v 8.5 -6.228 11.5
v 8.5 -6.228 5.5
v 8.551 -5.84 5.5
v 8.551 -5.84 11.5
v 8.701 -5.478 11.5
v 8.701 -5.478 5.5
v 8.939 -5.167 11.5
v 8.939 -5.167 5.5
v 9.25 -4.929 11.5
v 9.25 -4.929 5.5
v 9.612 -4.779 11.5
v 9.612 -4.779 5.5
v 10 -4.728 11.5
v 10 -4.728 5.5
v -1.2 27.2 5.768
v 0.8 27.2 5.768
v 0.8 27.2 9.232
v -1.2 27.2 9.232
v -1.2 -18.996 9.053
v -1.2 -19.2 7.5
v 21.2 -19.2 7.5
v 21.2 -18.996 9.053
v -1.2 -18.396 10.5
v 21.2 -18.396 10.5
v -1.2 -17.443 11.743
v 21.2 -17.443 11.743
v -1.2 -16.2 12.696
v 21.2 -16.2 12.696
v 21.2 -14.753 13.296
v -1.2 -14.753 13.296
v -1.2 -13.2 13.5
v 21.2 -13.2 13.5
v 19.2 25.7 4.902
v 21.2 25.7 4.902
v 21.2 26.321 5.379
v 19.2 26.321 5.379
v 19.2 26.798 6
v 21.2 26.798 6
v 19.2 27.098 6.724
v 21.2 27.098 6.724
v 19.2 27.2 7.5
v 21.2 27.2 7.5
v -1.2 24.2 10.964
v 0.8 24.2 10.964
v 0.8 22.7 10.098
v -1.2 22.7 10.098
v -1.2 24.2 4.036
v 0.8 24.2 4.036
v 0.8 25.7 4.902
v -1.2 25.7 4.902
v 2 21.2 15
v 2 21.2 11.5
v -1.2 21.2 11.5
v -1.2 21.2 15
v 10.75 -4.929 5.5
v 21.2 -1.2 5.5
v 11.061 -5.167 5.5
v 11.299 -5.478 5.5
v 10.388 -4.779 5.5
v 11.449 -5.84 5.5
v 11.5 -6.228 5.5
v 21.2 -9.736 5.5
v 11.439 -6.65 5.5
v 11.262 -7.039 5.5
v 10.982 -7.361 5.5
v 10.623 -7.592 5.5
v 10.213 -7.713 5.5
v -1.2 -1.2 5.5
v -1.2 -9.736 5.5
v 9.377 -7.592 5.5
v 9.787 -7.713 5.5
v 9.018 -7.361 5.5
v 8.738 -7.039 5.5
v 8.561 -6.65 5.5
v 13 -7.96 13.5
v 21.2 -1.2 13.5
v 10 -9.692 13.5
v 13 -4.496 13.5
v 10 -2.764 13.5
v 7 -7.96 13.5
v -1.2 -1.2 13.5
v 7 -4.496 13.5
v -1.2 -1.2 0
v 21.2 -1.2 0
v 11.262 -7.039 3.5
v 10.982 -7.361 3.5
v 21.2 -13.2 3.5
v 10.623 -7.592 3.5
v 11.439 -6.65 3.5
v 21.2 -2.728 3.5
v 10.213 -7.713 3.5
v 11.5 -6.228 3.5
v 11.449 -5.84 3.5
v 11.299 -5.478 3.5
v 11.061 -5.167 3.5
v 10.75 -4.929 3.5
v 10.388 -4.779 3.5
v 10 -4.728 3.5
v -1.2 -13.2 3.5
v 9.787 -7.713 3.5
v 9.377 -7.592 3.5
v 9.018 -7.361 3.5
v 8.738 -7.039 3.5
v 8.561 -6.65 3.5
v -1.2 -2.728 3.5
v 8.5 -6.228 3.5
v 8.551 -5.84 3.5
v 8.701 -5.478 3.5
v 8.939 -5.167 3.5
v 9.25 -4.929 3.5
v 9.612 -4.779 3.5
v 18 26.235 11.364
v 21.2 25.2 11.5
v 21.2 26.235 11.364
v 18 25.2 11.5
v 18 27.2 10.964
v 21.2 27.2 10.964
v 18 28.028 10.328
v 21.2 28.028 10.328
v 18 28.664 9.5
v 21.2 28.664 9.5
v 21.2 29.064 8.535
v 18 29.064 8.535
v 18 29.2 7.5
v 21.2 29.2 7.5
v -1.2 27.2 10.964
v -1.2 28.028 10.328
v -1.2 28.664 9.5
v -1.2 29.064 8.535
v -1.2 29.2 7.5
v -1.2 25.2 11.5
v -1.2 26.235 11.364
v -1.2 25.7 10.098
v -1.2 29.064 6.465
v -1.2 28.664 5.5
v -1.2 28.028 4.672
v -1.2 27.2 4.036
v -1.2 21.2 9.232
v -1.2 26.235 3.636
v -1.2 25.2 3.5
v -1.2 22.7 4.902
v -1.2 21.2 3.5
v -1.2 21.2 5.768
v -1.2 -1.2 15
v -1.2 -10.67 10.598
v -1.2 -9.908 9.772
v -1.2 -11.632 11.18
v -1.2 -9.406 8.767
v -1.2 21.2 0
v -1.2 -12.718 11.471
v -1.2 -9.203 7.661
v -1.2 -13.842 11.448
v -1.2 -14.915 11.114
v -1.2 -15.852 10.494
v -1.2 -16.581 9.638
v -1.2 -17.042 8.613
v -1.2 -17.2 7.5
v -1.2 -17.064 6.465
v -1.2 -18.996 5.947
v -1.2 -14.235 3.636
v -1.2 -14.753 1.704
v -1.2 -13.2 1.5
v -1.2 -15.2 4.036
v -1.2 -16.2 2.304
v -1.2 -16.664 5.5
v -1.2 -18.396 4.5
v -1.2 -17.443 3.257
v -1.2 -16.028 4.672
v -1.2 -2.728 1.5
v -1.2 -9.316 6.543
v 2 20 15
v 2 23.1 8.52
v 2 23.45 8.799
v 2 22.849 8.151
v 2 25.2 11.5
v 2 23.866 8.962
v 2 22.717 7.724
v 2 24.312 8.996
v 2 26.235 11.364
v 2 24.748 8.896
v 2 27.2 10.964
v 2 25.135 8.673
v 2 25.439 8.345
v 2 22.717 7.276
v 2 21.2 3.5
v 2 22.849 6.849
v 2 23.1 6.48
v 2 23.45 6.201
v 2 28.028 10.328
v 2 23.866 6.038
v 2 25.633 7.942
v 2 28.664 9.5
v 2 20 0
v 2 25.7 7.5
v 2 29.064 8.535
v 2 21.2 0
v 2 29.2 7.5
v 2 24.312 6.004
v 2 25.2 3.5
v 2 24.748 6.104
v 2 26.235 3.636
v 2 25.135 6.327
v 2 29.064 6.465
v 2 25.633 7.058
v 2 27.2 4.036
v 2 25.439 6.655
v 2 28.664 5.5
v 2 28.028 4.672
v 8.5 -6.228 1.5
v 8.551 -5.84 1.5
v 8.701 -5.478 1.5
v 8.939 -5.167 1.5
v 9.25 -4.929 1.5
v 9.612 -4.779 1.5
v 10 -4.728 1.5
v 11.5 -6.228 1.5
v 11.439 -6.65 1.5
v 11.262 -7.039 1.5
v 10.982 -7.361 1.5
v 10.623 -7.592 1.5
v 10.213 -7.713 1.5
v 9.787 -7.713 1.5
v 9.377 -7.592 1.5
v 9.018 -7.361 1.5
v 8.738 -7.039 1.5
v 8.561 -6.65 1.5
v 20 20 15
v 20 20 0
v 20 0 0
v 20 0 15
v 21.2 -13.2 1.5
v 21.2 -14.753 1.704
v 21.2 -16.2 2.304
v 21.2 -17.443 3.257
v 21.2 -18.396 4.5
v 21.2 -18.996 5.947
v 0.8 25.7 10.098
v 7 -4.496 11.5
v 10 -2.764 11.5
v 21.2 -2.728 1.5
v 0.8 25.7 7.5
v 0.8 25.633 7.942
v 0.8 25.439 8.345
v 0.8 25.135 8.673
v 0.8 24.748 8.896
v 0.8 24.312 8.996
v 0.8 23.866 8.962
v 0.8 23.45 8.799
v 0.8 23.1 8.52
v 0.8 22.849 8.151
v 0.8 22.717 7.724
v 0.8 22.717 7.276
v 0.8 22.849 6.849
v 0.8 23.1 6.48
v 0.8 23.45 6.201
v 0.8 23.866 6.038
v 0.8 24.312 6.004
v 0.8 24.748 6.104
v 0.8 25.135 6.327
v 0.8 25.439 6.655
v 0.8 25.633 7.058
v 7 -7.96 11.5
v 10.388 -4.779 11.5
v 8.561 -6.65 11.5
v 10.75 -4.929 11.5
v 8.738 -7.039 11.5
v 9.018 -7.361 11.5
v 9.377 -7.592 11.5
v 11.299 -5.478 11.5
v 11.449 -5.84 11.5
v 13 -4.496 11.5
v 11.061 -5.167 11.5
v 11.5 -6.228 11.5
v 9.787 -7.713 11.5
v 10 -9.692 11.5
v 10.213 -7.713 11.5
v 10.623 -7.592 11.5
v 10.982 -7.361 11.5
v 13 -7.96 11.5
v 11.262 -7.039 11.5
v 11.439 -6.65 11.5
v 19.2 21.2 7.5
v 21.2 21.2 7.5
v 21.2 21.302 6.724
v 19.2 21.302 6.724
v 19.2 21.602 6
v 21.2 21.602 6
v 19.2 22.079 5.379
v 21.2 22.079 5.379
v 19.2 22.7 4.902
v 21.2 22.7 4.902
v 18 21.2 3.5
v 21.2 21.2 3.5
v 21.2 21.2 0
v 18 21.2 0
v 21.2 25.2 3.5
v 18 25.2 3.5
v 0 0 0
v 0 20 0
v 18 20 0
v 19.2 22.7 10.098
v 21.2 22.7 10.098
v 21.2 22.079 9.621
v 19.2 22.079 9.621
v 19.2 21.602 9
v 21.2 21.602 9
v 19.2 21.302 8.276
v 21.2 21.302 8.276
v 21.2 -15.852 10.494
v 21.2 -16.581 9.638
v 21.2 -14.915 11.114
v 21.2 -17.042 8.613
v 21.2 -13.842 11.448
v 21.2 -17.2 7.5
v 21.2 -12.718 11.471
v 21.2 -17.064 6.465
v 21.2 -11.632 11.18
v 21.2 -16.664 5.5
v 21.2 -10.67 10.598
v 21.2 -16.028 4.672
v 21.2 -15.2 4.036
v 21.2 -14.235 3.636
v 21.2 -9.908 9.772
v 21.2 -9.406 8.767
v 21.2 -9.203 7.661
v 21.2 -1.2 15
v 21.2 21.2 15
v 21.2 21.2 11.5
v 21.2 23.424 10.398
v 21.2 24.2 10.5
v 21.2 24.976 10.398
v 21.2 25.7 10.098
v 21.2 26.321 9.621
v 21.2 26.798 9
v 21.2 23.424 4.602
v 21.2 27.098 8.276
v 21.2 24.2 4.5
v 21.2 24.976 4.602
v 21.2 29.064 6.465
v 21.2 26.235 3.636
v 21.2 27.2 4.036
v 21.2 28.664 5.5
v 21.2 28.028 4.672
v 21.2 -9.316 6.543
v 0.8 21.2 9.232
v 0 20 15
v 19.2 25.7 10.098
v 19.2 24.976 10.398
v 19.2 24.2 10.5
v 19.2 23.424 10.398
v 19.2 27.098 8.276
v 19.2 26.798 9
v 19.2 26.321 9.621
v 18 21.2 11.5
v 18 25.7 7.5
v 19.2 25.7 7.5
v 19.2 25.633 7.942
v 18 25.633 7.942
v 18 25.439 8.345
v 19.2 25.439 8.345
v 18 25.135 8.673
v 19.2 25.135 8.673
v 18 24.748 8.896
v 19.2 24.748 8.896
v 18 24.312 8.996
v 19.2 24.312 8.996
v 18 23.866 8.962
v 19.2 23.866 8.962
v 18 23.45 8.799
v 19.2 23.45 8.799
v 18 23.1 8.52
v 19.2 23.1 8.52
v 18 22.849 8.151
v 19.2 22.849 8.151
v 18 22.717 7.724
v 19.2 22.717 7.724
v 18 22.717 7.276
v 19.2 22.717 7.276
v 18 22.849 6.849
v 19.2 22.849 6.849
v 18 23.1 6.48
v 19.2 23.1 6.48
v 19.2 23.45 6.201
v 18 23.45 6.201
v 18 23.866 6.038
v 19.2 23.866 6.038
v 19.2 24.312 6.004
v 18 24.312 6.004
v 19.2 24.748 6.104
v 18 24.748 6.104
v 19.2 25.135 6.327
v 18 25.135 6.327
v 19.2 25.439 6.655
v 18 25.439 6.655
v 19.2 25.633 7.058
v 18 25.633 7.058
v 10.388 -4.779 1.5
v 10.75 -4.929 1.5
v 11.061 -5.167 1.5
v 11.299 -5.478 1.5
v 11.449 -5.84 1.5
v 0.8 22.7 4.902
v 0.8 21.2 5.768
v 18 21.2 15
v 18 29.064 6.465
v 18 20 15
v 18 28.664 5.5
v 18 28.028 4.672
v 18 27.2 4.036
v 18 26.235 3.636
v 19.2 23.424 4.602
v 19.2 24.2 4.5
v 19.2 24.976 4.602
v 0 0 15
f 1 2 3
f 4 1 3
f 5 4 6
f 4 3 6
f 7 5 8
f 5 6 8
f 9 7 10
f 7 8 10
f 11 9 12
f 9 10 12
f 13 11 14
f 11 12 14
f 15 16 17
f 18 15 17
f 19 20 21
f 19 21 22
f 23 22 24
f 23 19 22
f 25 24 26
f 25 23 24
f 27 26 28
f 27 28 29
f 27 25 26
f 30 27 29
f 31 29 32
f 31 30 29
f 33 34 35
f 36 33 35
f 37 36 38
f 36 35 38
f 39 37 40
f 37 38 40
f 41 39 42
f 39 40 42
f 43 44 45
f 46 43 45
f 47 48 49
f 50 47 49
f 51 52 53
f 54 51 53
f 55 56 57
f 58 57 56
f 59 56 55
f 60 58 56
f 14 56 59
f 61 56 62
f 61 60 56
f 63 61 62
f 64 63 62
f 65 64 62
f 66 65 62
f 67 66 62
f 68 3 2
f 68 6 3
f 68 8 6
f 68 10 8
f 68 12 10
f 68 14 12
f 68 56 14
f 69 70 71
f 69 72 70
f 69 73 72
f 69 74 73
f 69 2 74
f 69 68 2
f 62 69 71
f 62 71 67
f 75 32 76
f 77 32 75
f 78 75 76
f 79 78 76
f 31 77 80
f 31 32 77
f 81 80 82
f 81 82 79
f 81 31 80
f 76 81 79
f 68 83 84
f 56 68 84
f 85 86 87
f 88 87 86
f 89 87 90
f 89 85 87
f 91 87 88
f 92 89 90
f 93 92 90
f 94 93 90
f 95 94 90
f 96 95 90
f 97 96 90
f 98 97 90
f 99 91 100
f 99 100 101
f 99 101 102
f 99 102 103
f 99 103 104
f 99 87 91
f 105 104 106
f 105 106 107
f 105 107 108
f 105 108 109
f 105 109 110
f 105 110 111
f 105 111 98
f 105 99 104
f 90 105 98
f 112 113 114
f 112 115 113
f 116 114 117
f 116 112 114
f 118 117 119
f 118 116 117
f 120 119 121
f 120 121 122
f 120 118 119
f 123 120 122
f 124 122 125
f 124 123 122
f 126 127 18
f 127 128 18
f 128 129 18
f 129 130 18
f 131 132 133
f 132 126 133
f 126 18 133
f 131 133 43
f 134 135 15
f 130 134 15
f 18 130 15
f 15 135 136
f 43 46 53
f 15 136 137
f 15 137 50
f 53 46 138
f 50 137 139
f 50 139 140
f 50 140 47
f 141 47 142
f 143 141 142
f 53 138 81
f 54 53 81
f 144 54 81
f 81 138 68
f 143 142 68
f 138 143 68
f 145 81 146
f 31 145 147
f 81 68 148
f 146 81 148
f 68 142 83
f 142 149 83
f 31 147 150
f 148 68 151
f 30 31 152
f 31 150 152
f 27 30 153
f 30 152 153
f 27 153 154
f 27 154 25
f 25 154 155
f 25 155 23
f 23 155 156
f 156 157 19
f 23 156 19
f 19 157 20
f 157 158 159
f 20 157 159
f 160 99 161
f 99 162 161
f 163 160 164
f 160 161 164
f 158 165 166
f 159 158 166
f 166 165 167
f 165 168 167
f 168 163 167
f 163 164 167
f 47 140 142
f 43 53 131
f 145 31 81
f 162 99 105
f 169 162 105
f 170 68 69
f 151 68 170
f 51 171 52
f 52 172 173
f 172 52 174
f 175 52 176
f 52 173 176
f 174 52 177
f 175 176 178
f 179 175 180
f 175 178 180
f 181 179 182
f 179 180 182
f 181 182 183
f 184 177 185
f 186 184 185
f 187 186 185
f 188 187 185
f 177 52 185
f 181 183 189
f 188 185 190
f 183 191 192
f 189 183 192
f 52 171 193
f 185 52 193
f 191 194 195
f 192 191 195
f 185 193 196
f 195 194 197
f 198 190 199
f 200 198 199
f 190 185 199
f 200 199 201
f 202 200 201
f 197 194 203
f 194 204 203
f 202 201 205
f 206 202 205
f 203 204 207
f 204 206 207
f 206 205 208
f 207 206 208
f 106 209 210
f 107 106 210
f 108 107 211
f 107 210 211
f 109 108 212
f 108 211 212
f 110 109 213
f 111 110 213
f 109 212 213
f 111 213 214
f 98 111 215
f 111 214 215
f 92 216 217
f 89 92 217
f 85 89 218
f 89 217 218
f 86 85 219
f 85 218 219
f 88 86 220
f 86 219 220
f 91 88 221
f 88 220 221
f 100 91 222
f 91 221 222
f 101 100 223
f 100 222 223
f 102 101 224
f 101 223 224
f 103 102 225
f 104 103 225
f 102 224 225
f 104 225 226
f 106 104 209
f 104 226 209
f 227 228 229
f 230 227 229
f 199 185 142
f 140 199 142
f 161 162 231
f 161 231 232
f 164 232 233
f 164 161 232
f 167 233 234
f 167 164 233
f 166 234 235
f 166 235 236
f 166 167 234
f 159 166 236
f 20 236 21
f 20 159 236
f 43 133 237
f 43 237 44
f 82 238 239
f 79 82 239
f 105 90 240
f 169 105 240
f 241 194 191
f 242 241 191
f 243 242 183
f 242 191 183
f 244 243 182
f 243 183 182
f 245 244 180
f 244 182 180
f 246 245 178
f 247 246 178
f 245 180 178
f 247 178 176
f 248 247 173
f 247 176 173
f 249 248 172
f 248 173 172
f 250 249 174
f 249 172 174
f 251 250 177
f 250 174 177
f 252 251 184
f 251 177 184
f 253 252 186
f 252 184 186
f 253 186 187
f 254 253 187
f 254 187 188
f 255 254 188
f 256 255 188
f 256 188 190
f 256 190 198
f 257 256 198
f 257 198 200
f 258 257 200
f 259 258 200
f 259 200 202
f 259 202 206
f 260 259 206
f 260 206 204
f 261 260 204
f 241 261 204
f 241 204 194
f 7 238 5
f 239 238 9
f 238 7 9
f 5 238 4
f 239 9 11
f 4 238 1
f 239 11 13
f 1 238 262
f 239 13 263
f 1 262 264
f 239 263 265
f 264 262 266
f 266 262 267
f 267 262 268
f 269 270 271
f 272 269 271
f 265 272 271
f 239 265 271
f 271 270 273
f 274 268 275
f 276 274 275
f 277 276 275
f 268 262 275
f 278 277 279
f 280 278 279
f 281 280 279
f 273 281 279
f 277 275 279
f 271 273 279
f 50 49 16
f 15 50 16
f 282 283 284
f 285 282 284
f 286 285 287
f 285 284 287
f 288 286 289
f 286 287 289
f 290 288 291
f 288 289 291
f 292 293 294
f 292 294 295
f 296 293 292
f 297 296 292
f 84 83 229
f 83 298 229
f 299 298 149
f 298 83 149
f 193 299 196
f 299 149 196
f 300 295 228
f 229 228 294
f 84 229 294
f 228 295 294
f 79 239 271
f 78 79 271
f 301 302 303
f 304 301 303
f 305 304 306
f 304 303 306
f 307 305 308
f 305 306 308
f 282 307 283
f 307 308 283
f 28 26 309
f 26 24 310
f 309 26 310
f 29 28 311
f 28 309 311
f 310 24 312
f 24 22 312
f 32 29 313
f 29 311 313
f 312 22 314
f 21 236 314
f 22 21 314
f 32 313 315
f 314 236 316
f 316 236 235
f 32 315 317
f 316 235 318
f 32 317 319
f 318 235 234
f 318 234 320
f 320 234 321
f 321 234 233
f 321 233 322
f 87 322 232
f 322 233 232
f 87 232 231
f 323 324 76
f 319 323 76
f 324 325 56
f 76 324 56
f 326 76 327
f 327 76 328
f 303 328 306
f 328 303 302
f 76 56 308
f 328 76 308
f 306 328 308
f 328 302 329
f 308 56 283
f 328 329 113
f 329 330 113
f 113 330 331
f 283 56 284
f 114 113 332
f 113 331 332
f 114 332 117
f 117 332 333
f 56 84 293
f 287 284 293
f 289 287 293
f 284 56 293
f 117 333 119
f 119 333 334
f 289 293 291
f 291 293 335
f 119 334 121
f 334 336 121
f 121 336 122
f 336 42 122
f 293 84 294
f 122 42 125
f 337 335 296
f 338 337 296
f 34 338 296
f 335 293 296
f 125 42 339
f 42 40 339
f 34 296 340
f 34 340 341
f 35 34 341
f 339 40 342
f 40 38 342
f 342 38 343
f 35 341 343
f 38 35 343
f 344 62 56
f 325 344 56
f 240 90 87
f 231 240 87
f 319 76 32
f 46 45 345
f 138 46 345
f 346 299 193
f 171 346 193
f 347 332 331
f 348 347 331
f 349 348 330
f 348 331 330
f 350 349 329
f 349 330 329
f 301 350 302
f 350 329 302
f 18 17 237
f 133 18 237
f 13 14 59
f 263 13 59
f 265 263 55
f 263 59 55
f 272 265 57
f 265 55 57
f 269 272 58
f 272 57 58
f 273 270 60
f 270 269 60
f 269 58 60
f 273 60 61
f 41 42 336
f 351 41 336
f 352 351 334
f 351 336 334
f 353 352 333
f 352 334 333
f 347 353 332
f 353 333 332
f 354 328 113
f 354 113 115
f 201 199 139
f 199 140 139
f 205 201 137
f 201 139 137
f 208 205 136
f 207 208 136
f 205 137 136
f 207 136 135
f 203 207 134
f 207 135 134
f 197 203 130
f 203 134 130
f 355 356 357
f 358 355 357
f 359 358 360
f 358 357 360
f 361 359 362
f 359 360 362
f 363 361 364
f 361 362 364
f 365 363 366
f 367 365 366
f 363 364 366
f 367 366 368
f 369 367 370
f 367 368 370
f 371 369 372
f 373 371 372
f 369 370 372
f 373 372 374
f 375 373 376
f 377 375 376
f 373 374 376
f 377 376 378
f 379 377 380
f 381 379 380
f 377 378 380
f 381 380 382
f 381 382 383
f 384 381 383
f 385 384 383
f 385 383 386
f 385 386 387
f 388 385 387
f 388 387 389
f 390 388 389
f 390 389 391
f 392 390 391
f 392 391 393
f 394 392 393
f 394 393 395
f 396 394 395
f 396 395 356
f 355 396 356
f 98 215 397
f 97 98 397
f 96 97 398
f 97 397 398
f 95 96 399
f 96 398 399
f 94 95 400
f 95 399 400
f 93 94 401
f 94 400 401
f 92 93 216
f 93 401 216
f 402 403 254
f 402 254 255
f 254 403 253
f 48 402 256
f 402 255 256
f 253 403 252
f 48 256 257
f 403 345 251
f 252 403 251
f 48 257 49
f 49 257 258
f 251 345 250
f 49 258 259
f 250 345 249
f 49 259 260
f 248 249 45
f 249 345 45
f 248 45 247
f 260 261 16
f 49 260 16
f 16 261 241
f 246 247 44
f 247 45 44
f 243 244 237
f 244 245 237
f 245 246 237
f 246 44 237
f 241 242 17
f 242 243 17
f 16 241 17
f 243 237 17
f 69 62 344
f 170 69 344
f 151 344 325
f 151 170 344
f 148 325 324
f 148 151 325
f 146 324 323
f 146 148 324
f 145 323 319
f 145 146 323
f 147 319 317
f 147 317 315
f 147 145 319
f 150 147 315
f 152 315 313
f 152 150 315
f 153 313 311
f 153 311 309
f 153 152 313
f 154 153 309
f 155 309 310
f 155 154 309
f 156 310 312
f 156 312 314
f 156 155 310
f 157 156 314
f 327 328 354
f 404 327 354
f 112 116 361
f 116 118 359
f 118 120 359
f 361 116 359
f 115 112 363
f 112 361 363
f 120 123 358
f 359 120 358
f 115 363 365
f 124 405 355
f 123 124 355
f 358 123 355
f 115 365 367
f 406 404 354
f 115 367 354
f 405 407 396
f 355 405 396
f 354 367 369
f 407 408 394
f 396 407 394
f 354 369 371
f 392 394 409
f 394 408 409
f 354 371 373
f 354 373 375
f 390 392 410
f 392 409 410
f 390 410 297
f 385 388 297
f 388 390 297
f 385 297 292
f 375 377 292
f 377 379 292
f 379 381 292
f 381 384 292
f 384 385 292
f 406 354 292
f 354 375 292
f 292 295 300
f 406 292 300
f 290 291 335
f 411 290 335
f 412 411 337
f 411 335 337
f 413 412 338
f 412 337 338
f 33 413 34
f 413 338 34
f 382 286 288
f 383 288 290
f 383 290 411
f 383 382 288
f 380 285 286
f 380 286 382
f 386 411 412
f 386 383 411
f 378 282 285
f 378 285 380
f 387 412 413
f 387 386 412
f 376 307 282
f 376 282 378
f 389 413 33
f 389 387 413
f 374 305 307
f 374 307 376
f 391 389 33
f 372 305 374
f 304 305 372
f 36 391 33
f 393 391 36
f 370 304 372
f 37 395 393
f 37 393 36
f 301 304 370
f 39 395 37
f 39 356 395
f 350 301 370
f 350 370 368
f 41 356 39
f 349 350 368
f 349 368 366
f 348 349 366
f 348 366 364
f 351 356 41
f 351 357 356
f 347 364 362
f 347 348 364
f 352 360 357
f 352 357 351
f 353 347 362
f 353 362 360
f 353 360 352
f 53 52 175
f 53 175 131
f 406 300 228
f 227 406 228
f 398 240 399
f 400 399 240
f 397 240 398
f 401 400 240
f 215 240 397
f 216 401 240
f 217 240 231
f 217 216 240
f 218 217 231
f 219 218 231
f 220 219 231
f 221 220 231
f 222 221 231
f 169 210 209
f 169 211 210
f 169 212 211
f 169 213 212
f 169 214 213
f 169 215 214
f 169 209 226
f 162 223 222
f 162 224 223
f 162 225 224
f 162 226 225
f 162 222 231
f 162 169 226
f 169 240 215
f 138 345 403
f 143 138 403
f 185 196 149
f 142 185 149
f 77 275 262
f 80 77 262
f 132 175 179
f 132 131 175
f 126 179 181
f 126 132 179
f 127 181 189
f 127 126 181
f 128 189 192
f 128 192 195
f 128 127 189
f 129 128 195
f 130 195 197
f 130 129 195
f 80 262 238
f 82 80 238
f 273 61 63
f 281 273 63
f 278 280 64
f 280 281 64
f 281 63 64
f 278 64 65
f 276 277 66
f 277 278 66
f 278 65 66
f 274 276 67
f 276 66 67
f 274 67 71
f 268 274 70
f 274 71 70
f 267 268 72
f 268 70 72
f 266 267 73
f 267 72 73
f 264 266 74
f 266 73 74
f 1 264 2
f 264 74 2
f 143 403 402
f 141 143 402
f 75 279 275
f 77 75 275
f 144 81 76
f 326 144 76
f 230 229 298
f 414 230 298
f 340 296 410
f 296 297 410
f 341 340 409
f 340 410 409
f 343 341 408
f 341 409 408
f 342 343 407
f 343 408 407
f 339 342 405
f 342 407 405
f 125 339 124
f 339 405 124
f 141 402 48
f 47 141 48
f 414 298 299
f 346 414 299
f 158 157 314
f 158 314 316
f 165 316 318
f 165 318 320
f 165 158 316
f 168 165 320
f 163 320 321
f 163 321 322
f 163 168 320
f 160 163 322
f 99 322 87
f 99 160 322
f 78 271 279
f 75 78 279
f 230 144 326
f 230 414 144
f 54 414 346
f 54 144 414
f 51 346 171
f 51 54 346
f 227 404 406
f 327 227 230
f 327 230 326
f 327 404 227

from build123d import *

# Parameters (mm, degrees)
F1_DEPTH  = 15
F3_DEPTH  = 22.4
F5_DEPTH  = 25
F6_START  = -10
F6_DEPTH  = 15
F7_W      = 3.2
F7_H      = 8
F8_DEPTH  = 8
F9_R      = 3.99999
F10_R     = 1.5
F11_DEPTH = 25
F12_DEPTH = 2
F13_START = -20.4
F13_DEPTH = 4.6


# Not quite as in the source:
# - a fillet or chamfer is up to 0.001 mm smaller than in the source, because OpenCascade refuses the exact size


with BuildPart() as f1:
    # F0 (on Top) → F1 (new body)
    with BuildSketch(Plane.XY):
        Polygon((20, 0), (0, 0), (0, 20), (2, 20), (2, 21.2), (-1.2, 21.2), (-1.2, -1.2), (21.2, -1.2), (21.2, 21.2), (18, 21.2), (18, 20), (20, 20), align=None)
    extrude(amount=F1_DEPTH)

    # F2 (on face) → F3 (join)
    with BuildSketch(Plane(origin=(-1.2, 0, 0), x_dir=(0, -1, 0), z_dir=(-1, 0, 0))):
        with BuildLine():
            Line((1.2, 5.5), (7.5431457505, 5.5))
            ThreePointArc((7.5431457505, 5.5), (8.3010205144, 10.9641016151), (13.2, 13.5))
            Line((13.2, 13.5), (1.2, 13.5))
            Line((1.2, 13.5), (1.2, 5.5))
        make_face()
        with BuildLine():
            ThreePointArc((17.2, 7.5), (16.0284271247, 4.6715728753), (13.2, 3.5))
            Line((13.2, 3.5), (8.727864045, 3.5))
            ThreePointArc((8.727864045, 3.5), (10.7505102572, 2.0227744249), (13.2, 1.5))
            ThreePointArc((13.2, 1.5), (17.4426406871, 3.2573593129), (19.2, 7.5))
            ThreePointArc((19.2, 7.5), (17.4426406871, 11.7426406871), (13.2, 13.5))
            ThreePointArc((13.2, 13.5), (8.3010205144, 10.9641016151), (7.5431457505, 5.5))
            Line((7.5431457505, 5.5), (9.7358983849, 5.5))
            ThreePointArc((9.7358983849, 5.5), (12.1647238196, 11.3637033052), (17.2, 7.5))
        make_face()
        with BuildLine():
            ThreePointArc((13.2, 1.5), (10.7505102572, 2.0227744249), (8.727864045, 3.5))
            Line((8.727864045, 3.5), (2.727864045, 3.5))
            Line((2.727864045, 3.5), (2.727864045, 1.5))
            Line((2.727864045, 1.5), (13.2, 1.5))
        make_face()
    extrude(amount=-F3_DEPTH)

    # F4 (on face) → F5 (cut)
    with BuildSketch(Plane(origin=(0, 0, 1.5), x_dir=(1, 0, 0), z_dir=(0, 0, -1))):
        with BuildLine():
            ThreePointArc((8.5, 6.227864045), (8.9393398282, 5.1672038732), (10, 4.727864045))
            Line((10, 4.727864045), (10, 6.227864045))
            Line((10, 6.227864045), (8.5, 6.227864045))
        make_face()
        with BuildLine():
            Line((10, 6.227864045), (10, 4.727864045))
            ThreePointArc((10, 4.727864045), (11.0606601718, 5.1672038732), (11.5, 6.227864045))
            ThreePointArc((11.5, 6.227864045), (10, 7.727864045), (8.5, 6.227864045))
            Line((8.5, 6.227864045), (10, 6.227864045))
        make_face()
    extrude(amount=-F5_DEPTH, mode=Mode.SUBTRACT)

    # F4 (on face) → F6 (cut)
    with BuildSketch(Plane(origin=(0, 0, 1.5), x_dir=(1, 0, 0), z_dir=(0, 0, -1)).offset(F6_START)):
        with BuildLine():
            Line((10, 4.727864045), (10, 2.7637624299))
            Line((10, 2.7637624299), (13, 4.4958132374))
            Line((13, 4.4958132374), (13, 7.9599148526))
            Line((13, 7.9599148526), (10, 9.6919656601))
            Line((10, 9.6919656601), (7, 7.9599148526))
            Line((7, 7.9599148526), (7, 6.227864045))
            Line((7, 6.227864045), (8.5, 6.227864045))
            ThreePointArc((8.5, 6.227864045), (10, 7.727864045), (11.5, 6.227864045))
            ThreePointArc((11.5, 6.227864045), (11.0606601718, 5.1672038732), (10, 4.727864045))
        make_face()
        with BuildLine():
            Line((7, 4.4958132374), (10, 2.7637624299))
            Line((10, 2.7637624299), (10, 4.727864045))
            ThreePointArc((10, 4.727864045), (8.9393398282, 5.1672038732), (8.5, 6.227864045))
            Line((8.5, 6.227864045), (7, 6.227864045))
            Line((7, 6.227864045), (7, 4.4958132374))
        make_face()
    extrude(amount=-F6_DEPTH, mode=Mode.SUBTRACT)

    # F7 (on face) → F8 (join)
    with BuildSketch(Plane(origin=(0, 21.2, 0), x_dir=(-1, 0, 0), z_dir=(0, 1, 0))):
        with Locations((-19.6, 7.5)):
            Rectangle(F7_W, F7_H)
        with Locations((-0.4, 7.5)):
            Rectangle(F7_W, F7_H)
    extrude(amount=F8_DEPTH)

    # F9 (radius 4 in the source; OpenCascade refuses exactly that, so slightly less here)
    f9_edges = [f1.edges().sort_by_distance(p)[0] for p in [
        (19.6, 29.2, 11.5),
        (19.6, 29.2, 3.5),
        (0.4, 29.2, 11.5),
        (0.4, 29.2, 3.5),
    ]]
    fillet(f9_edges, radius=F9_R)

    # F10 (on face) → F11 (cut)
    with BuildSketch(Plane.YZ.offset(21.2)):
        with Locations((24.2, 7.5)):
            Circle(F10_R)
    extrude(amount=-F11_DEPTH, mode=Mode.SUBTRACT)

    # F10 (on face) → F12 (cut)
    with BuildSketch(Plane.YZ.offset(21.2)):
        with BuildLine():
            ThreePointArc((25.7000000635, 4.9019238253), (26.7980762297, 6.0000000317), (27.2, 7.5))
            ThreePointArc((27.2, 7.5), (26.7980761988, 9.0000000218), (25.6999999564, 10.0980762365))
            ThreePointArc((25.6999999564, 10.0980762365), (24.2, 10.5), (22.7000000436, 10.0980762365))
            ThreePointArc((22.7000000436, 10.0980762365), (21.6019238012, 9.0000000218), (21.2, 7.5))
            ThreePointArc((21.2, 7.5), (21.6019238012, 5.9999999782), (22.7000000436, 4.9019237635))
            ThreePointArc((22.7000000436, 4.9019237635), (24.2000000618, 4.5), (25.7000000635, 4.9019238253))
        make_face()
        with Locations((24.2, 7.5)):
            Circle(F10_R, mode=Mode.SUBTRACT)
    extrude(amount=-F12_DEPTH, mode=Mode.SUBTRACT)

    # F10 (on face) → F13 (cut)
    with BuildSketch(Plane.YZ.offset(21.2).offset(F13_START)):
        with BuildLine():
            ThreePointArc((21.2, 7.5), (21.6019238012, 9.0000000218), (22.7000000436, 10.0980762365))
            Line((22.7000000436, 10.0980762365), (21.2, 9.2320508076))
            Line((21.2, 9.2320508076), (21.2, 7.5))
        make_face()
        with BuildLine():
            ThreePointArc((22.7000000436, 10.0980762365), (24.2, 10.5), (25.6999999564, 10.0980762365))
            Line((25.6999999564, 10.0980762365), (24.2, 10.9641016151))
            Line((24.2, 10.9641016151), (22.7000000436, 10.0980762365))
        make_face()
        with BuildLine():
            ThreePointArc((25.6999999564, 10.0980762365), (26.7980761988, 9.0000000218), (27.2, 7.5))
            Line((27.2, 7.5), (27.2, 9.2320508076))
            Line((27.2, 9.2320508076), (25.6999999564, 10.0980762365))
        make_face()
        with BuildLine():
            ThreePointArc((25.7000000635, 4.9019238253), (26.7980762297, 6.0000000317), (27.2, 7.5))
            ThreePointArc((27.2, 7.5), (26.7980761988, 9.0000000218), (25.6999999564, 10.0980762365))
            ThreePointArc((25.6999999564, 10.0980762365), (24.2, 10.5), (22.7000000436, 10.0980762365))
            ThreePointArc((22.7000000436, 10.0980762365), (21.6019238012, 9.0000000218), (21.2, 7.5))
            ThreePointArc((21.2, 7.5), (21.6019238012, 5.9999999782), (22.7000000436, 4.9019237635))
            ThreePointArc((22.7000000436, 4.9019237635), (24.2000000618, 4.5), (25.7000000635, 4.9019238253))
        make_face()
        with Locations((24.2, 7.5)):
            Circle(F10_R, mode=Mode.SUBTRACT)
        with BuildLine():
            Line((24.2, 4.0358983849), (25.7000000635, 4.9019238253))
            ThreePointArc((25.7000000635, 4.9019238253), (24.2000000618, 4.5), (22.7000000436, 4.9019237635))
            Line((22.7000000436, 4.9019237635), (24.2, 4.0358983849))
        make_face()
        with BuildLine():
            Line((21.2, 5.7679491924), (22.7000000436, 4.9019237635))
            ThreePointArc((22.7000000436, 4.9019237635), (21.6019238012, 5.9999999782), (21.2, 7.5))
            Line((21.2, 7.5), (21.2, 5.7679491924))
        make_face()
        with BuildLine():
            Line((27.2, 5.7679491924), (27.2, 7.5))
            ThreePointArc((27.2, 7.5), (26.7980762297, 6.0000000317), (25.7000000635, 4.9019238253))
            Line((25.7000000635, 4.9019238253), (27.2, 5.7679491924))
        make_face()
    extrude(amount=-F13_DEPTH, mode=Mode.SUBTRACT)


solid = f1.part
